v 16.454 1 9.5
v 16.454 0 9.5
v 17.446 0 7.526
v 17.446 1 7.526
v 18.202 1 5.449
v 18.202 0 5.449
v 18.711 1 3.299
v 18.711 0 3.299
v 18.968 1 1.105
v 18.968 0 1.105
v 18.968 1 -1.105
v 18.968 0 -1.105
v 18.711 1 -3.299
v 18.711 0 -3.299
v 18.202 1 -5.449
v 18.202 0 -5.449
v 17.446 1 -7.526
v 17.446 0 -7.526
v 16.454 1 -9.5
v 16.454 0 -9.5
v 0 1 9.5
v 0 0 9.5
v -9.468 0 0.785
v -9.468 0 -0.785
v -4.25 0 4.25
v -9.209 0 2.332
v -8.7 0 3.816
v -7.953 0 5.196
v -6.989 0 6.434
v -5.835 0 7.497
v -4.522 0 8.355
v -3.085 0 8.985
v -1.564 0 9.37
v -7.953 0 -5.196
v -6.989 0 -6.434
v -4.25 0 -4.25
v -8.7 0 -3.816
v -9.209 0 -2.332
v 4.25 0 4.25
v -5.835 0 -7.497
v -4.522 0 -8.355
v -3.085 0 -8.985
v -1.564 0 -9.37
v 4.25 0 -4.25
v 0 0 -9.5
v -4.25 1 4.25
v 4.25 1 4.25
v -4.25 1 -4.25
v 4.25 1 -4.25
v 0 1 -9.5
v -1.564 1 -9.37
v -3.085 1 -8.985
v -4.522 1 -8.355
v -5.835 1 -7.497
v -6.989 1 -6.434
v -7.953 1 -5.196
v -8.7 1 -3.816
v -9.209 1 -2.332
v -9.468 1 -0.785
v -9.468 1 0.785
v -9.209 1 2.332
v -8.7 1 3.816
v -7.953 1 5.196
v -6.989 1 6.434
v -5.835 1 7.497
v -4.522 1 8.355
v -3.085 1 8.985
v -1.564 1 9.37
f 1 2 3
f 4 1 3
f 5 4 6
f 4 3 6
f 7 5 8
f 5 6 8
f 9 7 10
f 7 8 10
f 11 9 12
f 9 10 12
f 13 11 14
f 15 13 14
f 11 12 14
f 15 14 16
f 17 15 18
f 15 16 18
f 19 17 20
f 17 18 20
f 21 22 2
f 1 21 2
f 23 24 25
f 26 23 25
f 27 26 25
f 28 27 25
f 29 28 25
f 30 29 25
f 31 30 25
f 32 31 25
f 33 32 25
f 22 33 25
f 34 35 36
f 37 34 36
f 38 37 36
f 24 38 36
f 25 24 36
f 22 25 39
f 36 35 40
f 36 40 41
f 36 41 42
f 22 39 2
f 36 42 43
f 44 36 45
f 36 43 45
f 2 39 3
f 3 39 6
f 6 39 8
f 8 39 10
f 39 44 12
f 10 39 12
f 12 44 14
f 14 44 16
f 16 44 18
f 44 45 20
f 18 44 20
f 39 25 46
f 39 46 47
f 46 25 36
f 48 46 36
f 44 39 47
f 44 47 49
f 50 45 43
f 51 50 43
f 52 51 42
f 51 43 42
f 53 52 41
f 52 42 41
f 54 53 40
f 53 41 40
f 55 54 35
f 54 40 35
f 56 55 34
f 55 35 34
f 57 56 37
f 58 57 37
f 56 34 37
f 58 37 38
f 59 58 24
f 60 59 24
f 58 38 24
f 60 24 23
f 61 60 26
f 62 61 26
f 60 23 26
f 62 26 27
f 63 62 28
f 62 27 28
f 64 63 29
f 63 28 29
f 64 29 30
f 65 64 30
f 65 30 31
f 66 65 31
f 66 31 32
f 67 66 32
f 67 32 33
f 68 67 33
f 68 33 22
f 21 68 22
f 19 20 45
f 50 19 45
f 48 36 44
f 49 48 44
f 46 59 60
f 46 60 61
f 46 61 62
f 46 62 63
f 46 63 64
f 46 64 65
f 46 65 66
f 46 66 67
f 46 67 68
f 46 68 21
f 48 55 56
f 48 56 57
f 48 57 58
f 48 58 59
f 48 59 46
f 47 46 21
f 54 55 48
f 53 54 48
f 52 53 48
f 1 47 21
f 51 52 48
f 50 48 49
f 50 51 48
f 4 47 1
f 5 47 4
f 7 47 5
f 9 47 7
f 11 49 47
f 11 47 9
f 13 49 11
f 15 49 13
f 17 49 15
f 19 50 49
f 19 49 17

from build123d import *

# Parameters (mm, degrees)
SKIZZE1_W                       = 8.5
SKIZZE1_H                       = 8.5
AUFSATZ_LINEAR_AUSTRAGEN1_DEPTH = 1


with BuildPart() as part:
    # Skizze1 → Aufsatz-Linear austragen1 (new body)
    with BuildSketch(Plane(origin=(0, 0, 0), x_dir=(1, 0, 0), z_dir=(0, 1, 0))):
        with BuildLine():
            Line((0, -9.5), (16.454482672, -9.5))
            ThreePointArc((16.454482672, -9.5), (19, 0), (16.454482672, 9.5))
            Line((16.454482672, 9.5), (0, 9.5))
            ThreePointArc((0, 9.5), (-9.5, 0), (0, -9.5))
        make_face()
        Rectangle(SKIZZE1_W, SKIZZE1_H, mode=Mode.SUBTRACT)
    extrude(amount=AUFSATZ_LINEAR_AUSTRAGEN1_DEPTH)


solid = part.part
